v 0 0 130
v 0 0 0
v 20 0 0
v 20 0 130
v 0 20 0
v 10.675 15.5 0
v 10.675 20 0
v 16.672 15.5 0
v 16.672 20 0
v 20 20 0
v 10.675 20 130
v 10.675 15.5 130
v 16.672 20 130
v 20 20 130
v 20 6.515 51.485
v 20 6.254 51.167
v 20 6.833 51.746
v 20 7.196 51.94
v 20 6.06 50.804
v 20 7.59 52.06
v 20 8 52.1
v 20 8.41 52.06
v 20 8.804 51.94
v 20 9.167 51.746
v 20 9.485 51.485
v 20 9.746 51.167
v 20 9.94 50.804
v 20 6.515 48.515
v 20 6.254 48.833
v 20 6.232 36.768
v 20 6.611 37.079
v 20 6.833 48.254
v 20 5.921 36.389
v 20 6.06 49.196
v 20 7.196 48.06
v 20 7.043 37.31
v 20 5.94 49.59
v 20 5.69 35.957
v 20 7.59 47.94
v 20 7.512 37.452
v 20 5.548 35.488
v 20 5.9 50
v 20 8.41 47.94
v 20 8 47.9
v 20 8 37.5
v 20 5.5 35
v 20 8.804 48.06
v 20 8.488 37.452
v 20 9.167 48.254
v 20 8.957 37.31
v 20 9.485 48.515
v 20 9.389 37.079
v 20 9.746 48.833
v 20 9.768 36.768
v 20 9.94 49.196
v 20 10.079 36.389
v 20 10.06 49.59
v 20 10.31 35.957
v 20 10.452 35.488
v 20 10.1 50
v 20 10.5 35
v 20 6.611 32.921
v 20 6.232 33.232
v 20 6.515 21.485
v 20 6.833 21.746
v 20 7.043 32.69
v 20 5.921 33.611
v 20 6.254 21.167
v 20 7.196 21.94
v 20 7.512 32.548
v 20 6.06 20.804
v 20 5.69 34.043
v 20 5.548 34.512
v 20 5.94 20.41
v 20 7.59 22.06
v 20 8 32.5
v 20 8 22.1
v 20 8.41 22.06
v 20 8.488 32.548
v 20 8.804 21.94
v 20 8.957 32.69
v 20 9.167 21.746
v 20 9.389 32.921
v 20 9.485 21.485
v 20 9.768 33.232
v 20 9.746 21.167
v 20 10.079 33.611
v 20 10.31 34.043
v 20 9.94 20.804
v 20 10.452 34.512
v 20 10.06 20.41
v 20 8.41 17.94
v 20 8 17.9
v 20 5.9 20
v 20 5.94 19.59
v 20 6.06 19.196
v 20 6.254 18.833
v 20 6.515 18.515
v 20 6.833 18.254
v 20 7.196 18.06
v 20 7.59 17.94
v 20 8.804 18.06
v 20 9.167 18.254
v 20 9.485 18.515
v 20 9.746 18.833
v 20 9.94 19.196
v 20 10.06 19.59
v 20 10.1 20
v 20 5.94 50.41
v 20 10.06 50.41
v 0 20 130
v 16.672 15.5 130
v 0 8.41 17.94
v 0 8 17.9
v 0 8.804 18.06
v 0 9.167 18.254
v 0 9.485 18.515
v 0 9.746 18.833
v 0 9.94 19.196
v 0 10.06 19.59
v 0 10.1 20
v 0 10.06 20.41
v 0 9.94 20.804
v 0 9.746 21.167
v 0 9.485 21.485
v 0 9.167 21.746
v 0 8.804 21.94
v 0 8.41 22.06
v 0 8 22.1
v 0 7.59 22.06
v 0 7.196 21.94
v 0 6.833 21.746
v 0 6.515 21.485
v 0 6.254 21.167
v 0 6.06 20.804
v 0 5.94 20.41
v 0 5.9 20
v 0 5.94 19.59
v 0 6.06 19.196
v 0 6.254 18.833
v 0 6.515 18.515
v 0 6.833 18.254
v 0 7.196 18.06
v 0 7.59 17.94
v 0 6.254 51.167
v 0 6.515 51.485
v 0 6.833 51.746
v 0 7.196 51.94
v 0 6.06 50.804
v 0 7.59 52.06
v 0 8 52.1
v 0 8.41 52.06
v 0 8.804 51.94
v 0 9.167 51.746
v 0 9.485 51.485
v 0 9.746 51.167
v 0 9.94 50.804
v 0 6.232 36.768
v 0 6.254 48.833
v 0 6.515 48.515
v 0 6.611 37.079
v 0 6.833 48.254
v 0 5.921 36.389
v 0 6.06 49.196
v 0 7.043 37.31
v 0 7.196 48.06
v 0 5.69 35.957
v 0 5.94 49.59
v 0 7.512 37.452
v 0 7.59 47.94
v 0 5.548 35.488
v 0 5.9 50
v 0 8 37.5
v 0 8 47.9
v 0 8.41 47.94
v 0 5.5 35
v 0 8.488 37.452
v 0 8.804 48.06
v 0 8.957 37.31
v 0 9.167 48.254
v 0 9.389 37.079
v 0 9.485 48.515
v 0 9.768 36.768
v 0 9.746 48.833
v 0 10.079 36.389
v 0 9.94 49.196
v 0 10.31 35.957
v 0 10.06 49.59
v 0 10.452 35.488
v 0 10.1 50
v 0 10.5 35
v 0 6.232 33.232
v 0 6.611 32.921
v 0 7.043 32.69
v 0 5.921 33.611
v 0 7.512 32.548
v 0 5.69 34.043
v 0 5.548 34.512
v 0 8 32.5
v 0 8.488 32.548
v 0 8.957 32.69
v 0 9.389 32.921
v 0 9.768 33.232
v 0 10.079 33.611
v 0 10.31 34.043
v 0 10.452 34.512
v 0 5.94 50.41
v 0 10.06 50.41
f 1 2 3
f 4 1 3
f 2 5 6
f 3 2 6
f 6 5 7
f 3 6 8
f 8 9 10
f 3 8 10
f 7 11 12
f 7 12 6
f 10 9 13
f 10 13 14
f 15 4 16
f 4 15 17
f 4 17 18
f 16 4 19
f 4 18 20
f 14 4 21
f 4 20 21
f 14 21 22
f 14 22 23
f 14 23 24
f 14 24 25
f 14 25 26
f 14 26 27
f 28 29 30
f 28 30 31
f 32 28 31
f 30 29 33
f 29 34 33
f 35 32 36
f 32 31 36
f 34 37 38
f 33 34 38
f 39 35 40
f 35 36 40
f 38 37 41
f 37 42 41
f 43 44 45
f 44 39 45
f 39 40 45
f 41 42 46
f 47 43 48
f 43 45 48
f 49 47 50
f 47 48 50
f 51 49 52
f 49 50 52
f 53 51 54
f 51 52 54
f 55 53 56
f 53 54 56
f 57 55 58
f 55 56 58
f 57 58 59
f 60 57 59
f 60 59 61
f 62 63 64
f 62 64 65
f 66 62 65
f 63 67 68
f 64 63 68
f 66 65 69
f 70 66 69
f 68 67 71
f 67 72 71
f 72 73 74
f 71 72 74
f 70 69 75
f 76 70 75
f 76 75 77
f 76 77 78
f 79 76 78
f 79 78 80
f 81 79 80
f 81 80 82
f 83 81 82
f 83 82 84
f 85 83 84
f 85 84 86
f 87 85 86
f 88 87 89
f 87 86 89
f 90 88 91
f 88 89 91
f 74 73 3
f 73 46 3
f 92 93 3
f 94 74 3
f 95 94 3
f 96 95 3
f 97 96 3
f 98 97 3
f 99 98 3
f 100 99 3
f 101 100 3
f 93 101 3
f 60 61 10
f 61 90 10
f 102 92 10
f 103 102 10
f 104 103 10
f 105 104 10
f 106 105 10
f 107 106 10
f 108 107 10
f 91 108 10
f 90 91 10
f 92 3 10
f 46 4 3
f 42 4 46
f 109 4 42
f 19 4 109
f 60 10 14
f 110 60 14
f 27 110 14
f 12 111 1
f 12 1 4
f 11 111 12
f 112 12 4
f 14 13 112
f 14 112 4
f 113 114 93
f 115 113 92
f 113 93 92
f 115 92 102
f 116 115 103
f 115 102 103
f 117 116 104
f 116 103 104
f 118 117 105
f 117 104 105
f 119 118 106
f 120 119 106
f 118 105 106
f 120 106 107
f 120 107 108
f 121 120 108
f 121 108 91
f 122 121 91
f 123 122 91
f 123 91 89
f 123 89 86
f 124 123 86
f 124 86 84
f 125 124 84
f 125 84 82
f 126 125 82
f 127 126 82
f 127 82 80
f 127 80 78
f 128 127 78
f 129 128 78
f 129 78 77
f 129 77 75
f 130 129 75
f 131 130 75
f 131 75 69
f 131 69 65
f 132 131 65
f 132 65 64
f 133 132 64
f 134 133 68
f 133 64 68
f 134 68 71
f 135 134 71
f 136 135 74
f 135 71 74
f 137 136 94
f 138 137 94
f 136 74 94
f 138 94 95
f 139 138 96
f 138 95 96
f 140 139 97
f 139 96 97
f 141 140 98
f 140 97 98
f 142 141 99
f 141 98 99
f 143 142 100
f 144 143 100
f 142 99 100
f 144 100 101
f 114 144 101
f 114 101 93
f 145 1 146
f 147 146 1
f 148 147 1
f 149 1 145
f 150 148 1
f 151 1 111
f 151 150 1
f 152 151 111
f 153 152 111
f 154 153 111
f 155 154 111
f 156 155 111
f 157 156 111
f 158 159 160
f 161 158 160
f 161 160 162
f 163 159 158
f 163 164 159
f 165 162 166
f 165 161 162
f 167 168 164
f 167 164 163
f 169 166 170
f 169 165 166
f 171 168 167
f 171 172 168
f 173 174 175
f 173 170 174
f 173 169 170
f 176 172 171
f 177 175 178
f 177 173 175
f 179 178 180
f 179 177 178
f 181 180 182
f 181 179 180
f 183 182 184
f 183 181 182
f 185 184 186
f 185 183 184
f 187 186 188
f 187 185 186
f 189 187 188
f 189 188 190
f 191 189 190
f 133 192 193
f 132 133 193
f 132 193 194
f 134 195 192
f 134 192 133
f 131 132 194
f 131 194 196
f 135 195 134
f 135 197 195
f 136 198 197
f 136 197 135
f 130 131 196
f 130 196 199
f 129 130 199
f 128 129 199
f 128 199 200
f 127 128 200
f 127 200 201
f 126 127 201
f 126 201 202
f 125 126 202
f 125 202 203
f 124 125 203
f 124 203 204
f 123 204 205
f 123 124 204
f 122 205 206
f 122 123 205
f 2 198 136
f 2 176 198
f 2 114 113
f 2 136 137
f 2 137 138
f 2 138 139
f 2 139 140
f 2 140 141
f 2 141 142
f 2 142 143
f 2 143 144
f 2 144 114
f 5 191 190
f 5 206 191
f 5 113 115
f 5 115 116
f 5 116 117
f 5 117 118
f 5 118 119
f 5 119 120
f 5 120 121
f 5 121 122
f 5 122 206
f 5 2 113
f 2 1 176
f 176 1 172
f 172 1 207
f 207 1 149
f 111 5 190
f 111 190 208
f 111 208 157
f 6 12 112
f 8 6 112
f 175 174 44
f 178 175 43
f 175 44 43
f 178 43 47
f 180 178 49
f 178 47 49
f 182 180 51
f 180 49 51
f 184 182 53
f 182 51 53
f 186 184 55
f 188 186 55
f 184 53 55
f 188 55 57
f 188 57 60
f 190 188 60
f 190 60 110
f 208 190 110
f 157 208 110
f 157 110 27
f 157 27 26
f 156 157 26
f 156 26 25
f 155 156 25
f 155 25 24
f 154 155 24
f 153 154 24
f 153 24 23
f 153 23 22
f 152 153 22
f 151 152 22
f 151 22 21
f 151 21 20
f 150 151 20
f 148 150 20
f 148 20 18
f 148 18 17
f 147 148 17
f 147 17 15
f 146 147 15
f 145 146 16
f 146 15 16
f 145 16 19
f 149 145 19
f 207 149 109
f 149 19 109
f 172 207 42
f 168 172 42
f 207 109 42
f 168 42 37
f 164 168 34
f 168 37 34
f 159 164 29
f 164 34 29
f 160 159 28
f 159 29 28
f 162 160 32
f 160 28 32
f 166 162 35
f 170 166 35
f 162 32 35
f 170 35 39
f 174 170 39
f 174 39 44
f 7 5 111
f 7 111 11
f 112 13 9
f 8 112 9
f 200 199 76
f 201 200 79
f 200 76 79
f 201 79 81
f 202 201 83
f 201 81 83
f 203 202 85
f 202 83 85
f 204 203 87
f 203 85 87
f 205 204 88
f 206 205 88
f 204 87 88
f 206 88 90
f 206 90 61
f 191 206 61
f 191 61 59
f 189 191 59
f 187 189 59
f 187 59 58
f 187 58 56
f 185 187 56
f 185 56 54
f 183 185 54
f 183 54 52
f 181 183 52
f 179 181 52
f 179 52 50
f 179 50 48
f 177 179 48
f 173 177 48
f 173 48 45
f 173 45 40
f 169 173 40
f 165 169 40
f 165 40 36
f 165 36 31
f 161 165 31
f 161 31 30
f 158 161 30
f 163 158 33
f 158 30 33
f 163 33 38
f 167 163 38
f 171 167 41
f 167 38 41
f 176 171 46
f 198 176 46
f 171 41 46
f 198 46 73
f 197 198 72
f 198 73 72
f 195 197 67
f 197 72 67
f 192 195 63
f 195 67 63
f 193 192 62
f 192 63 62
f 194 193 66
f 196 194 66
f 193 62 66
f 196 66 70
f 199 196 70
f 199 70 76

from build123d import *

# Parameters (mm, degrees)
SKETCH_1_W          = 20
SKETCH_1_H          = 20
EXTRUDE_1_DEPTH     = 130
SKETCH_2_W          = 5.996199515
SKETCH_2_H          = 130
CUT_EXTRUDE_1_DEPTH = 4.5
HOLE_WIZARD_M5_1_D  = 4.2
SKETCH_5_R          = 2.5
CUT_EXTRUDE_2_DEPTH = 21


with BuildPart() as part:
    # 草图1 → 凸台-拉伸1 (new body)
    with BuildSketch(Plane.XY):
        with Locations((10, 10)):
            Rectangle(SKETCH_1_W, SKETCH_1_H)
    extrude(amount=EXTRUDE_1_DEPTH)

    # 草图2 → 切除-拉伸1 (cut)
    with BuildSketch(Plane(origin=(0, 20, 0), x_dir=(1, 0, 0), z_dir=(0, 1, 0))):
        with Locations((13.673460813, -65)):
            Rectangle(SKETCH_2_W, SKETCH_2_H)
    extrude(amount=-CUT_EXTRUDE_1_DEPTH, mode=Mode.SUBTRACT)

    # M5 螺纹孔1 (through all)
    with Locations(Plane.ZY):
        with Locations((20, 8), (50, 8)):
            Hole(HOLE_WIZARD_M5_1_D / 2)

    # 草图5 → 切除-拉伸2 (cut, through all)
    with BuildSketch(Plane(origin=(20, 0, 0), x_dir=(0, 0, -1), z_dir=(1, 0, 0))):
        with Locations((-35, 8)):
            Circle(SKETCH_5_R)
    extrude(amount=-CUT_EXTRUDE_2_DEPTH, mode=Mode.SUBTRACT)


solid = part.part
